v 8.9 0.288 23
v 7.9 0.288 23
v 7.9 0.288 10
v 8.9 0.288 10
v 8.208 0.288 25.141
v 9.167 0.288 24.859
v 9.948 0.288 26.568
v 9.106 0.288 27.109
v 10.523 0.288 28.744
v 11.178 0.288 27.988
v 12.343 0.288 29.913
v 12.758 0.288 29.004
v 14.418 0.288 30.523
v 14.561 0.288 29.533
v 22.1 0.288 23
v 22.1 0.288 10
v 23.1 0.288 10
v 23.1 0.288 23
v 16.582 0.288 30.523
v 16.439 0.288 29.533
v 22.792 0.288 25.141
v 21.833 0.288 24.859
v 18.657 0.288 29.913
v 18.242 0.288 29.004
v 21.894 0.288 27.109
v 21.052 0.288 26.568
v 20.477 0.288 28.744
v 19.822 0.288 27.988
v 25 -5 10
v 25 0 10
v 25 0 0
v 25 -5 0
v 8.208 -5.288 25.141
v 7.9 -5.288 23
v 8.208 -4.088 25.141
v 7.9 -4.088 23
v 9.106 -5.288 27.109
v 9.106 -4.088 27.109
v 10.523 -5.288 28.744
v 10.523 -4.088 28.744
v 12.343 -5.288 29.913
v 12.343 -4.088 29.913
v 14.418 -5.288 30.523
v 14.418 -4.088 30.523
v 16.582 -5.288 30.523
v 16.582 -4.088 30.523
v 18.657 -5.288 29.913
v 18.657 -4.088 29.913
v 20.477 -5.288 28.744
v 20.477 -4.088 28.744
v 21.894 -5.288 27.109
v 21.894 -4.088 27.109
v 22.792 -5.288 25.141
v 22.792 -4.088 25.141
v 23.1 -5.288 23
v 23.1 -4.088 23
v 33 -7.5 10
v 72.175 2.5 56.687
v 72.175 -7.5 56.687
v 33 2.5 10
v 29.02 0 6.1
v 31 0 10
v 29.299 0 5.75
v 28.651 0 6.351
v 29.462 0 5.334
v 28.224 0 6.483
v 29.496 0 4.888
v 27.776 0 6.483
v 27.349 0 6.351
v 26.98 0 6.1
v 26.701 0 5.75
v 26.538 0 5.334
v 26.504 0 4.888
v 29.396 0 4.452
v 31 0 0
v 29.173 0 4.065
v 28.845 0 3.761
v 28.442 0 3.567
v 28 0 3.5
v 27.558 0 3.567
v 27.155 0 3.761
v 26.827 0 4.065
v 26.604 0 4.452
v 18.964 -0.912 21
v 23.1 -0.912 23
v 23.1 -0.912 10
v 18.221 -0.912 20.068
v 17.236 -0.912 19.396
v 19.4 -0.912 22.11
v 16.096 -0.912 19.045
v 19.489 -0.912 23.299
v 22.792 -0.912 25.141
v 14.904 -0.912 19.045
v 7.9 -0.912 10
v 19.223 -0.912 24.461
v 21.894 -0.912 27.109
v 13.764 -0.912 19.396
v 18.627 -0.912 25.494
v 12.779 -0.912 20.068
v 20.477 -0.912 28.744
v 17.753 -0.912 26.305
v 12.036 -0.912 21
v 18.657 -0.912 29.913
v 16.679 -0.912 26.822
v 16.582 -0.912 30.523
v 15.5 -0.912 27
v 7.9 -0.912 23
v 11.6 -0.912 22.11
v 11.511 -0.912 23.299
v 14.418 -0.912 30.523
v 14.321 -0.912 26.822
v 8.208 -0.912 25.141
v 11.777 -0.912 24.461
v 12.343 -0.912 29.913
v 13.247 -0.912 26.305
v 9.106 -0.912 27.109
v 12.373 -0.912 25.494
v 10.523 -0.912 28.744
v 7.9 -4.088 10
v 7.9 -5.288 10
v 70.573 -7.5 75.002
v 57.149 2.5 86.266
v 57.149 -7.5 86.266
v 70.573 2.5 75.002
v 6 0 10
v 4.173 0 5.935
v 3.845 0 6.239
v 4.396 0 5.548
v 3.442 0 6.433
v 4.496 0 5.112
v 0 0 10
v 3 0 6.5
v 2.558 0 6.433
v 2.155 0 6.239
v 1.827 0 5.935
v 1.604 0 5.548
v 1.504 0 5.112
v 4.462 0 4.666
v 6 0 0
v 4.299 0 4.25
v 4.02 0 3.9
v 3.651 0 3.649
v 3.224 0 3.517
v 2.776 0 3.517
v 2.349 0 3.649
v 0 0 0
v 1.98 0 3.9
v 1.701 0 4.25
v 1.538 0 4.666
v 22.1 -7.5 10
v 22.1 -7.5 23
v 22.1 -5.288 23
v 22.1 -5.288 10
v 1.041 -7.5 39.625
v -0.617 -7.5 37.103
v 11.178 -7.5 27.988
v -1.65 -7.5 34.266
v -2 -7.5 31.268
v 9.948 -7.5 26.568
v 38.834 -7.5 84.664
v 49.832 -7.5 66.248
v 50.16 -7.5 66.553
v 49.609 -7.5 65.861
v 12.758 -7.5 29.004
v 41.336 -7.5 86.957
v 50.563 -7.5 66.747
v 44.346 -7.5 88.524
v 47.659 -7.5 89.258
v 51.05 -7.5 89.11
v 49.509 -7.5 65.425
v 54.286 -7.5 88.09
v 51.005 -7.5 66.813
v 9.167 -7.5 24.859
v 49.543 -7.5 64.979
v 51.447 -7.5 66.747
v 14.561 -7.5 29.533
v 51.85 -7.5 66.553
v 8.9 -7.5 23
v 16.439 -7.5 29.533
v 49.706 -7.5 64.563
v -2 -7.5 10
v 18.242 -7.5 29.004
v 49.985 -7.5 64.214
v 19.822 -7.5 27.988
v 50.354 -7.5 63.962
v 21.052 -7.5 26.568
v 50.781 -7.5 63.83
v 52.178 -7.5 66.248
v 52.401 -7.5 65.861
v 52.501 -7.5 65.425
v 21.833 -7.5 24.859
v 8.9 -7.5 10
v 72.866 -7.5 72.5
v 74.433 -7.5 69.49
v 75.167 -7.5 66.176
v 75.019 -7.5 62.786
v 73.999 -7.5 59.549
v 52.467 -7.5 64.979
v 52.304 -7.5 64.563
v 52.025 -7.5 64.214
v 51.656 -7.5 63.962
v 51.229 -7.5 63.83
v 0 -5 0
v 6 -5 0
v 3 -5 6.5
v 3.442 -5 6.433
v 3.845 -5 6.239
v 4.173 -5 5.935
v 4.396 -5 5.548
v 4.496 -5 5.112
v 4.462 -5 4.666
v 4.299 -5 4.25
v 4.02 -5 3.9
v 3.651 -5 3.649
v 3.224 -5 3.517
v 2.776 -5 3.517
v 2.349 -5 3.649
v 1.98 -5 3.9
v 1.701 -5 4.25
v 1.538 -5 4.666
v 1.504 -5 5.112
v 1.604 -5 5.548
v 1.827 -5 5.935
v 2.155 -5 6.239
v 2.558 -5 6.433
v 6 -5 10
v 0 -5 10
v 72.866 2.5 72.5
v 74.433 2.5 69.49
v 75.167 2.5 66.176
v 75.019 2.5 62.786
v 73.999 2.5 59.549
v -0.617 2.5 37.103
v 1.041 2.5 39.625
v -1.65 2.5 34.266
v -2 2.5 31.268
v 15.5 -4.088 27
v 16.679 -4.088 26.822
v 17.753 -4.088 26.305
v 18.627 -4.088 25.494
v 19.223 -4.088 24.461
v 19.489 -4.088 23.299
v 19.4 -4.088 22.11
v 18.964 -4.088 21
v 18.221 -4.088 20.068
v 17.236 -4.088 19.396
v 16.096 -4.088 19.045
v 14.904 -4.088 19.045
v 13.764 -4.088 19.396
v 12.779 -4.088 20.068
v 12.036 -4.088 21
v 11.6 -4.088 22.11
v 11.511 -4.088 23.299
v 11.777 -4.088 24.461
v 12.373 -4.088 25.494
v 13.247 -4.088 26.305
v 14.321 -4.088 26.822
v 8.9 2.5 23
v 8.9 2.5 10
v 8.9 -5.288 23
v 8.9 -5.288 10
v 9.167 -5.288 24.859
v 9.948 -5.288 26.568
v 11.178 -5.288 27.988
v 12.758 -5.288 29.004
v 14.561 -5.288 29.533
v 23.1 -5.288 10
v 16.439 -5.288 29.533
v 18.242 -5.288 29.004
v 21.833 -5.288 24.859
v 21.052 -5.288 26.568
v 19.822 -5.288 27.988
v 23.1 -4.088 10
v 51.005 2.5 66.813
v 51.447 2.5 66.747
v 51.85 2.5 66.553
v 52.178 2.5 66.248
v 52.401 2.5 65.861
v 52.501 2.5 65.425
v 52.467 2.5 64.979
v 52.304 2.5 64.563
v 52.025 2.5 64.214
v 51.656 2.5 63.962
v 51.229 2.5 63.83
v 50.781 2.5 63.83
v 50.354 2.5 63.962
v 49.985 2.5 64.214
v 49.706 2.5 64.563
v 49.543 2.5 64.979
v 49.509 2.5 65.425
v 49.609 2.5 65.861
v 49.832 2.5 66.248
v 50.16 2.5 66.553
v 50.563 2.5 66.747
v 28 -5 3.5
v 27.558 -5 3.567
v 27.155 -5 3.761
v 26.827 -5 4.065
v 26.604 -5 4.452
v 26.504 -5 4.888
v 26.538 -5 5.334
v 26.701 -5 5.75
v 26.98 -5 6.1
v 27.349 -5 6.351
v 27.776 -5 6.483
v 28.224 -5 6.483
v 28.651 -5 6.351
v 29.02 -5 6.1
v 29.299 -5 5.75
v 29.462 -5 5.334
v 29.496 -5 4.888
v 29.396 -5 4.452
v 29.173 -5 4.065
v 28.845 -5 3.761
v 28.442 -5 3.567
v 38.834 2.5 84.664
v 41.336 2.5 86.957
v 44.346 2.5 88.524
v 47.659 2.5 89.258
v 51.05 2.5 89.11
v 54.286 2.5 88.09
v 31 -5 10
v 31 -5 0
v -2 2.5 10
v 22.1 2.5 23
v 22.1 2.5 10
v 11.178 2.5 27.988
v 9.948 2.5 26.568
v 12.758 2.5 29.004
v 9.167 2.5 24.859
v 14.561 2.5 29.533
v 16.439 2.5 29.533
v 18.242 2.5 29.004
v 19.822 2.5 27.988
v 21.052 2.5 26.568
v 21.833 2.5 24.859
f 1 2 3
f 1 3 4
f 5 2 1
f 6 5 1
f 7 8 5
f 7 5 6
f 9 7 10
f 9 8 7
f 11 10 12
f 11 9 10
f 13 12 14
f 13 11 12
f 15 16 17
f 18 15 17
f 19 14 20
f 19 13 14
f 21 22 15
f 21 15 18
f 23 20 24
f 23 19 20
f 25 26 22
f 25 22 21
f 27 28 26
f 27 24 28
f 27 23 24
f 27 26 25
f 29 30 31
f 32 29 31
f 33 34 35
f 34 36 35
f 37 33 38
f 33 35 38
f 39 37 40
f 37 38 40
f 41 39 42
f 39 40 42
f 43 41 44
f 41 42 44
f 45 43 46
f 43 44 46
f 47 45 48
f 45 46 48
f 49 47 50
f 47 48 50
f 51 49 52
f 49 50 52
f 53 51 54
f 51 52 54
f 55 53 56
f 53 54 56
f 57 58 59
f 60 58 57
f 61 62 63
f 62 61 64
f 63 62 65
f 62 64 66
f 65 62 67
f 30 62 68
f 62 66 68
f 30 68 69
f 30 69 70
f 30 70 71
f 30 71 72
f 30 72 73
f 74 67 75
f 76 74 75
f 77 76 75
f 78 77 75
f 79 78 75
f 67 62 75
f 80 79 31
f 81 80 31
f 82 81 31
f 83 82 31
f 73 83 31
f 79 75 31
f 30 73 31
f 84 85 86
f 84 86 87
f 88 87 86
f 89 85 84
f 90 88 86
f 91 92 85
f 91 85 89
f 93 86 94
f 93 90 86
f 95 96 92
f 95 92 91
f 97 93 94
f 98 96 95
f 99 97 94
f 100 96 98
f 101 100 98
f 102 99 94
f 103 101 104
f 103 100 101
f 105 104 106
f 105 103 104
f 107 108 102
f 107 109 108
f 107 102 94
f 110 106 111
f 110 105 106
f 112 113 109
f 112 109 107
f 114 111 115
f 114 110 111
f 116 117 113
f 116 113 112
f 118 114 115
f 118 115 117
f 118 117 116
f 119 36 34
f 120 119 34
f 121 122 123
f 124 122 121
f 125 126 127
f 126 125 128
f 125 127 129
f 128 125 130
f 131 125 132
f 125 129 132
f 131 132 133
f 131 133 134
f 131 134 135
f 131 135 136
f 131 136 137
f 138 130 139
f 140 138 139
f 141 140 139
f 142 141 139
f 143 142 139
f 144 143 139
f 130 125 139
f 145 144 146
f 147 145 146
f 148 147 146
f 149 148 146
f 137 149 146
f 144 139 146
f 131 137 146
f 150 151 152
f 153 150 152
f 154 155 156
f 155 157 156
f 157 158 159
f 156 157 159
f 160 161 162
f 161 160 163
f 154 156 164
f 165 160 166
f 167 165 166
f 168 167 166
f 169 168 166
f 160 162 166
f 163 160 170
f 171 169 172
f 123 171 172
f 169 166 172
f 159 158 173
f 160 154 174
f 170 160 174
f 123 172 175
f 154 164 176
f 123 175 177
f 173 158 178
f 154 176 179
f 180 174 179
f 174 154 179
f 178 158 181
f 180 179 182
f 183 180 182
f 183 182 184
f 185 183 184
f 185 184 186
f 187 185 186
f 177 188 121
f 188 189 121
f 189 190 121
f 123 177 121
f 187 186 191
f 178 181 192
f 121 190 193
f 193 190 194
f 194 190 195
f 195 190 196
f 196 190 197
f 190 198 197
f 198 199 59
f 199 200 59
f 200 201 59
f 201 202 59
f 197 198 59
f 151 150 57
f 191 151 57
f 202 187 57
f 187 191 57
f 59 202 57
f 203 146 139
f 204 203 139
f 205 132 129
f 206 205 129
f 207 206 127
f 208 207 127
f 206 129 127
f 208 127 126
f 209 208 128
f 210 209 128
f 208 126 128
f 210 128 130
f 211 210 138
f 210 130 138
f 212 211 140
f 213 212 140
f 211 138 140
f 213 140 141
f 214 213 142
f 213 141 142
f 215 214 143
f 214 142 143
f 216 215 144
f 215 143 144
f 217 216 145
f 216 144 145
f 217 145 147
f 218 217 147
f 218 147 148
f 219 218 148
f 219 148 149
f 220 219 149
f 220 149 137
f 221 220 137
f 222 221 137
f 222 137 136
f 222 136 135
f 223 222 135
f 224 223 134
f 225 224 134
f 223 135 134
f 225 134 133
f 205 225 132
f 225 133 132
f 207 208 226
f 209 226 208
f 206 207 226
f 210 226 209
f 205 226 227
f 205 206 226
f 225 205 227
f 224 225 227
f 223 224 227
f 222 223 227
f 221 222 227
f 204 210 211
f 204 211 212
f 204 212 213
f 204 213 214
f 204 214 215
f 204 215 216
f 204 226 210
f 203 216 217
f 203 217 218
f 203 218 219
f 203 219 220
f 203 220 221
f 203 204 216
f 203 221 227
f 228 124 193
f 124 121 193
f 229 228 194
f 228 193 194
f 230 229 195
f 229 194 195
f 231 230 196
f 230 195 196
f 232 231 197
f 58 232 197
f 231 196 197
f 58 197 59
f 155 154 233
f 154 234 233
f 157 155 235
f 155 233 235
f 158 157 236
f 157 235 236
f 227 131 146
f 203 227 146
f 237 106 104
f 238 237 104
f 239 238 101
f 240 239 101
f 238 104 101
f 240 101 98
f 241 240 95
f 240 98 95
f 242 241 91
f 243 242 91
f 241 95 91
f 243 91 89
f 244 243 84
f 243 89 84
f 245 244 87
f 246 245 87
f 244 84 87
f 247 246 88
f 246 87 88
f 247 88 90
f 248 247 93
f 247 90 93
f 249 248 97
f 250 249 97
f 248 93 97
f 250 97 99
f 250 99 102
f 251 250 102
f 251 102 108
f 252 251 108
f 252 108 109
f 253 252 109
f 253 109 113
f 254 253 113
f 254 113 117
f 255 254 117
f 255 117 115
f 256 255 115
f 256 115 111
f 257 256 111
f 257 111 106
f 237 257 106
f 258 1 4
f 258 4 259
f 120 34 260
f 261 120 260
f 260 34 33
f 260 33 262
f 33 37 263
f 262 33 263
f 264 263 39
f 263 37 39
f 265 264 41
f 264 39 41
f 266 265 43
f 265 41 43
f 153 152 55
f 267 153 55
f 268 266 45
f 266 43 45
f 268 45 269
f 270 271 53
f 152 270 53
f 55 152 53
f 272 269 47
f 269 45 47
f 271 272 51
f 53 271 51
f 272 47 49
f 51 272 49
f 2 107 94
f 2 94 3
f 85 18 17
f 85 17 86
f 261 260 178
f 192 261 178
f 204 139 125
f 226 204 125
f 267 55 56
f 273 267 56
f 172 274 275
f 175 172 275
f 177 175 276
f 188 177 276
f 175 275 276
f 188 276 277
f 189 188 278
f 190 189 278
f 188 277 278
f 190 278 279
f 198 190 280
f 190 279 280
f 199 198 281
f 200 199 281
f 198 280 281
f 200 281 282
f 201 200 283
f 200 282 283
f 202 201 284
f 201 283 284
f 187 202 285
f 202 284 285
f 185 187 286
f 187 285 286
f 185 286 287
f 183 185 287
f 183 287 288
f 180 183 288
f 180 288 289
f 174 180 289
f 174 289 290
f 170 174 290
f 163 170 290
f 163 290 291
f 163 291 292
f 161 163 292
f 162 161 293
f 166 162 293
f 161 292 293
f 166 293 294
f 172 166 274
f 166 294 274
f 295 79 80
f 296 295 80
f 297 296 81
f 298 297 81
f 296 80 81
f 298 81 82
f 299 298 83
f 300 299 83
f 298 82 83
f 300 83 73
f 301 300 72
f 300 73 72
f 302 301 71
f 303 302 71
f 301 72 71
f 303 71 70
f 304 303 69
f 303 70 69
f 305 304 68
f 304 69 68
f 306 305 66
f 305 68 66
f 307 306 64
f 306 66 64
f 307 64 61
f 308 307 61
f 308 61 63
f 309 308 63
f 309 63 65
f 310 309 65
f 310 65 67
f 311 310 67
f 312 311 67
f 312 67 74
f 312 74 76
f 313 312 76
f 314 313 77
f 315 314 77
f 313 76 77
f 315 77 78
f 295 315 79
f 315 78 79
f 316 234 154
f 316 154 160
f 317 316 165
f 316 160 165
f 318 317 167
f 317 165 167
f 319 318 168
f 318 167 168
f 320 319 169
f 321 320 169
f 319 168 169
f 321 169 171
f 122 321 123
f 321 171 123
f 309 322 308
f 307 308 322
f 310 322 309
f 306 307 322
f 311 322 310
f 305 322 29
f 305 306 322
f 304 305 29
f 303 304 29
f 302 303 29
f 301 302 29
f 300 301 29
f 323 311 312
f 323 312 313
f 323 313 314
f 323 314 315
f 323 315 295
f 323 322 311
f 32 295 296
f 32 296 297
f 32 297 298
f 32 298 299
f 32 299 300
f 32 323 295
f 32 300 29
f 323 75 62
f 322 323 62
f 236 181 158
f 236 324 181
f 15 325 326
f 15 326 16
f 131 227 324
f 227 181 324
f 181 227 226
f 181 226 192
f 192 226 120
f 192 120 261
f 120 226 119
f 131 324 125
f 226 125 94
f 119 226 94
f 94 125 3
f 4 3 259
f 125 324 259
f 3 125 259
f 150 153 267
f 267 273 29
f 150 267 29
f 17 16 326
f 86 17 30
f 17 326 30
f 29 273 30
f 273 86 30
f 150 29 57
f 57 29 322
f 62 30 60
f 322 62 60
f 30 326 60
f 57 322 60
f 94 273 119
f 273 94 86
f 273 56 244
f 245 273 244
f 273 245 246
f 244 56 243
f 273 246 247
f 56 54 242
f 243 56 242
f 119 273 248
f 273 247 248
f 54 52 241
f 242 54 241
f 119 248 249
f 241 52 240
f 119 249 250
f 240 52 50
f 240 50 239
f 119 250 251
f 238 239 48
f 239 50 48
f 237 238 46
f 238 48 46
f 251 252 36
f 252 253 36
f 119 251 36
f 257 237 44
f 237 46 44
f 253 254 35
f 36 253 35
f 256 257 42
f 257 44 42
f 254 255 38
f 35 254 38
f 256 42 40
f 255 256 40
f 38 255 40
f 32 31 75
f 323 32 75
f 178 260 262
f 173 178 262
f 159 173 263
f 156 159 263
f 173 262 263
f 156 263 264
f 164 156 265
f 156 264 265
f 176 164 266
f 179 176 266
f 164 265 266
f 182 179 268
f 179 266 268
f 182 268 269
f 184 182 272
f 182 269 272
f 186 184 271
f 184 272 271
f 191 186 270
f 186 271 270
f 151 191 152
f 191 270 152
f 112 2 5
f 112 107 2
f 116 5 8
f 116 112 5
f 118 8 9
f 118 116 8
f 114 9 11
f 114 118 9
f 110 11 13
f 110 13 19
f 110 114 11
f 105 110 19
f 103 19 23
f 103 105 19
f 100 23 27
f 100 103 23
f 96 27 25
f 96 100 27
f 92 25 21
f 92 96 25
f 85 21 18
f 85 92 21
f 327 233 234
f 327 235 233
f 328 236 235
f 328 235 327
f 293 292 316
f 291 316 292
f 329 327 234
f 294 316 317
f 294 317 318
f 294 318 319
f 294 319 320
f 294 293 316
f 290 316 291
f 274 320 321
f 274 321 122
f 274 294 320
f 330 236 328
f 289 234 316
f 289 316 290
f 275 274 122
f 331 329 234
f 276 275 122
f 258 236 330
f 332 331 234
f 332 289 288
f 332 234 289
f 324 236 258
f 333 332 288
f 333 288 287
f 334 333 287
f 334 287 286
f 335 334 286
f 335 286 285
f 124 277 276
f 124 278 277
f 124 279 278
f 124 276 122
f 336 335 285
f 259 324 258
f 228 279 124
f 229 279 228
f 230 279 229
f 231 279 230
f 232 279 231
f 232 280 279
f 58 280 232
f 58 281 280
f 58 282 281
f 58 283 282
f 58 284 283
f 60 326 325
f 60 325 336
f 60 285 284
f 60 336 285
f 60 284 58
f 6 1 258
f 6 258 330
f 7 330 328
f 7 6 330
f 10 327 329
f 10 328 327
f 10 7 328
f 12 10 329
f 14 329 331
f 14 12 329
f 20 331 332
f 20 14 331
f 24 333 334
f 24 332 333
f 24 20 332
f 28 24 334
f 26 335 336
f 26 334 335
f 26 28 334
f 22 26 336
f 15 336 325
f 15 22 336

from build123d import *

# Parameters (mm, degrees)
SKETCH10_W          = 35
SKETCH10_H          = 26
BOSS_EXTRUDE4_DEPTH = 2.5
SKETCH1_R           = 1.5
BOSS_EXTRUDE5_DEPTH = 5
SKETCH11_W          = 35
SKETCH11_H          = 26
BOSS_EXTRUDE6_DEPTH = 2.5
CUT_EXTRUDE1_START  = -13
CUT_EXTRUDE1_DEPTH  = 56.676105727
SKETCH4_R           = 7.6
CUT_EXTRUDE2_DEPTH  = 1.2
SKETCH5_R           = 6.6
CUT_EXTRUDE3_DEPTH  = 50.27874954
SKETCH8_R           = 4
CUT_EXTRUDE6_DEPTH  = 50.27874954
SKETCH13_R          = 1.5
BOSS_EXTRUDE7_DEPTH = 10
FILLET1_R           = 13
CUT_EXTRUDE11_DEPTH = 154.613950883
FILLET2_R           = 13


with BuildPart() as part:
    # Sketch10 → Boss-Extrude4 (new body)
    with BuildSketch(Plane(origin=(0, 0, 0), x_dir=(1, 0, 0), z_dir=(0, 1, 0))):
        with Locations((15.5, -23)):
            Rectangle(SKETCH10_W, SKETCH10_H)
    extrude(amount=BOSS_EXTRUDE4_DEPTH)

    # Sketch1 → Boss-Extrude5 (add)
    with BuildSketch(Plane(origin=(0, 0, 0), x_dir=(1, 0, 0), z_dir=(0, 1, 0))):
        Polygon((0, 0), (6, 0), (6, -10), (25, -10), (25, 0), (31, 0), (31, -10), (33, -10), (33, -36), (-2, -36), (-2, -10), (0, -10), align=None)
        with Locations(Location((3, -5, 0), (0, 0, 270))):
            Circle(SKETCH1_R, mode=Mode.SUBTRACT)
        with Locations(Location((28, -5, 0), (0, 0, 90))):
            Circle(SKETCH1_R, mode=Mode.SUBTRACT)
    extrude(amount=-BOSS_EXTRUDE5_DEPTH)

    # Sketch11 → Boss-Extrude6 (add)
    with BuildSketch(Plane.XZ.offset(5)):
        with Locations((15.5, 23)):
            Rectangle(SKETCH11_W, SKETCH11_H)
    extrude(amount=BOSS_EXTRUDE6_DEPTH)

    # Sketch3 → Cut-Extrude1 (cut)
    with BuildSketch(Plane(origin=(0, 0, 10), x_dir=(-1, 0, 0), z_dir=(0, 0, -1)).offset(CUT_EXTRUDE1_START)):
        Polygon((-22.1, 2.5), (-22.1, 0.2875), (-23.1, 0.2875), (-23.1, -0.9125), (-15.5, -0.9125), (-7.9, -0.9125), (-7.9, 0.2875), (-8.9, 0.2875), (-8.9, 2.5), align=None)
    cut_extrude1 = extrude(amount=CUT_EXTRUDE1_DEPTH, mode=Mode.SUBTRACT)

    # Sketch4 → Cut-Extrude2 (cut)
    with BuildSketch(Plane(origin=(0, -0.9125, 0), x_dir=(1, 0, 0), z_dir=(0, 1, 0))):
        with Locations((15.5, -23)):
            Circle(SKETCH4_R)
    cut_extrude2 = extrude(amount=CUT_EXTRUDE2_DEPTH, mode=Mode.SUBTRACT)

    # Sketch5 → Cut-Extrude3 (cut, through all)
    with BuildSketch(Plane(origin=(0, -0.9125, 0), x_dir=(1, 0, 0), z_dir=(0, 1, 0))):
        with Locations((15.5, -23)):
            Circle(SKETCH5_R)
    cut_extrude3 = extrude(amount=CUT_EXTRUDE3_DEPTH, mode=Mode.SUBTRACT)

    # Sketch8 → Cut-Extrude6 (cut, through all)
    with BuildSketch(Plane(origin=(0, -0.9125, 0), x_dir=(1, 0, 0), z_dir=(0, 1, 0))):
        with Locations(Location((15.5, -23, 0), (0, 0, 270))):
            Circle(SKETCH8_R)
    extrude(amount=-CUT_EXTRUDE6_DEPTH, mode=Mode.SUBTRACT)

    # Mirror1: Cut-Extrude1, Cut-Extrude2, Cut-Extrude3 across plane
    add(cut_extrude1.mirror(Plane.ZX.offset(-2.5)), mode=Mode.SUBTRACT)
    add(cut_extrude2.mirror(Plane.ZX.offset(-2.5)), mode=Mode.SUBTRACT)
    add(cut_extrude3.mirror(Plane.ZX.offset(-2.5)), mode=Mode.SUBTRACT)

    # Sketch13 → Boss-Extrude7 (add)
    with BuildSketch(Plane(origin=(0, 2.5, 0), x_dir=(1, 0, 0), z_dir=(0, 1, 0))):
        Polygon((-2, -36), (70.668567607, -122.603026514), (104.009911505, -94.626317146), (33, -10), (33, -36), align=None)
        with Locations(Location((51.004955752, -65.313158573, 0), (0, 0, 270))):
            Circle(SKETCH13_R, mode=Mode.SUBTRACT)
    extrude(amount=-BOSS_EXTRUDE7_DEPTH)

    # Fillet1
    fillet1_edges = [part.edges().sort_by_distance(p)[0] for p in [
        (104.009911505, -2.5, 94.626317146),
        (70.668567607, -2.5, 122.603026514),
        (-2, -2.5, 36),
    ]]
    fillet(fillet1_edges, radius=FILLET1_R)

    # Sketch18 → Cut-Extrude11 (cut, through all)
    with BuildSketch(Plane(origin=(0, 2.5, 0), x_dir=(1, 0, 0), z_dir=(0, 1, 0))):
        with BuildLine():
            Line((47.190035997, -94.622402119), (80.531379895, -66.645692751))
            Line((80.531379895, -66.645692751), (95.653672579, -84.667739385))
            ThreePointArc((95.653672579, -84.667739385), (98.645625894, -94.157002967), (94.051333744, -102.982556072))
            Line((94.051333744, -102.982556072), (80.627145367, -114.246787588))
            ThreePointArc((80.627145367, -114.246787588), (71.137881786, -117.238740903), (62.312328681, -112.644448753))
            Line((62.312328681, -112.644448753), (47.190035997, -94.622402119))
        make_face()
    extrude(amount=-CUT_EXTRUDE11_DEPTH, mode=Mode.SUBTRACT)

    # Fillet2
    fillet2_edges = [part.edges().sort_by_distance(p)[0] for p in [
        (47.190035997, -2.5, 94.622402119),
        (80.531379895, -2.5, 66.645692751),
    ]]
    fillet(fillet2_edges, radius=FILLET2_R)


solid = part.part
